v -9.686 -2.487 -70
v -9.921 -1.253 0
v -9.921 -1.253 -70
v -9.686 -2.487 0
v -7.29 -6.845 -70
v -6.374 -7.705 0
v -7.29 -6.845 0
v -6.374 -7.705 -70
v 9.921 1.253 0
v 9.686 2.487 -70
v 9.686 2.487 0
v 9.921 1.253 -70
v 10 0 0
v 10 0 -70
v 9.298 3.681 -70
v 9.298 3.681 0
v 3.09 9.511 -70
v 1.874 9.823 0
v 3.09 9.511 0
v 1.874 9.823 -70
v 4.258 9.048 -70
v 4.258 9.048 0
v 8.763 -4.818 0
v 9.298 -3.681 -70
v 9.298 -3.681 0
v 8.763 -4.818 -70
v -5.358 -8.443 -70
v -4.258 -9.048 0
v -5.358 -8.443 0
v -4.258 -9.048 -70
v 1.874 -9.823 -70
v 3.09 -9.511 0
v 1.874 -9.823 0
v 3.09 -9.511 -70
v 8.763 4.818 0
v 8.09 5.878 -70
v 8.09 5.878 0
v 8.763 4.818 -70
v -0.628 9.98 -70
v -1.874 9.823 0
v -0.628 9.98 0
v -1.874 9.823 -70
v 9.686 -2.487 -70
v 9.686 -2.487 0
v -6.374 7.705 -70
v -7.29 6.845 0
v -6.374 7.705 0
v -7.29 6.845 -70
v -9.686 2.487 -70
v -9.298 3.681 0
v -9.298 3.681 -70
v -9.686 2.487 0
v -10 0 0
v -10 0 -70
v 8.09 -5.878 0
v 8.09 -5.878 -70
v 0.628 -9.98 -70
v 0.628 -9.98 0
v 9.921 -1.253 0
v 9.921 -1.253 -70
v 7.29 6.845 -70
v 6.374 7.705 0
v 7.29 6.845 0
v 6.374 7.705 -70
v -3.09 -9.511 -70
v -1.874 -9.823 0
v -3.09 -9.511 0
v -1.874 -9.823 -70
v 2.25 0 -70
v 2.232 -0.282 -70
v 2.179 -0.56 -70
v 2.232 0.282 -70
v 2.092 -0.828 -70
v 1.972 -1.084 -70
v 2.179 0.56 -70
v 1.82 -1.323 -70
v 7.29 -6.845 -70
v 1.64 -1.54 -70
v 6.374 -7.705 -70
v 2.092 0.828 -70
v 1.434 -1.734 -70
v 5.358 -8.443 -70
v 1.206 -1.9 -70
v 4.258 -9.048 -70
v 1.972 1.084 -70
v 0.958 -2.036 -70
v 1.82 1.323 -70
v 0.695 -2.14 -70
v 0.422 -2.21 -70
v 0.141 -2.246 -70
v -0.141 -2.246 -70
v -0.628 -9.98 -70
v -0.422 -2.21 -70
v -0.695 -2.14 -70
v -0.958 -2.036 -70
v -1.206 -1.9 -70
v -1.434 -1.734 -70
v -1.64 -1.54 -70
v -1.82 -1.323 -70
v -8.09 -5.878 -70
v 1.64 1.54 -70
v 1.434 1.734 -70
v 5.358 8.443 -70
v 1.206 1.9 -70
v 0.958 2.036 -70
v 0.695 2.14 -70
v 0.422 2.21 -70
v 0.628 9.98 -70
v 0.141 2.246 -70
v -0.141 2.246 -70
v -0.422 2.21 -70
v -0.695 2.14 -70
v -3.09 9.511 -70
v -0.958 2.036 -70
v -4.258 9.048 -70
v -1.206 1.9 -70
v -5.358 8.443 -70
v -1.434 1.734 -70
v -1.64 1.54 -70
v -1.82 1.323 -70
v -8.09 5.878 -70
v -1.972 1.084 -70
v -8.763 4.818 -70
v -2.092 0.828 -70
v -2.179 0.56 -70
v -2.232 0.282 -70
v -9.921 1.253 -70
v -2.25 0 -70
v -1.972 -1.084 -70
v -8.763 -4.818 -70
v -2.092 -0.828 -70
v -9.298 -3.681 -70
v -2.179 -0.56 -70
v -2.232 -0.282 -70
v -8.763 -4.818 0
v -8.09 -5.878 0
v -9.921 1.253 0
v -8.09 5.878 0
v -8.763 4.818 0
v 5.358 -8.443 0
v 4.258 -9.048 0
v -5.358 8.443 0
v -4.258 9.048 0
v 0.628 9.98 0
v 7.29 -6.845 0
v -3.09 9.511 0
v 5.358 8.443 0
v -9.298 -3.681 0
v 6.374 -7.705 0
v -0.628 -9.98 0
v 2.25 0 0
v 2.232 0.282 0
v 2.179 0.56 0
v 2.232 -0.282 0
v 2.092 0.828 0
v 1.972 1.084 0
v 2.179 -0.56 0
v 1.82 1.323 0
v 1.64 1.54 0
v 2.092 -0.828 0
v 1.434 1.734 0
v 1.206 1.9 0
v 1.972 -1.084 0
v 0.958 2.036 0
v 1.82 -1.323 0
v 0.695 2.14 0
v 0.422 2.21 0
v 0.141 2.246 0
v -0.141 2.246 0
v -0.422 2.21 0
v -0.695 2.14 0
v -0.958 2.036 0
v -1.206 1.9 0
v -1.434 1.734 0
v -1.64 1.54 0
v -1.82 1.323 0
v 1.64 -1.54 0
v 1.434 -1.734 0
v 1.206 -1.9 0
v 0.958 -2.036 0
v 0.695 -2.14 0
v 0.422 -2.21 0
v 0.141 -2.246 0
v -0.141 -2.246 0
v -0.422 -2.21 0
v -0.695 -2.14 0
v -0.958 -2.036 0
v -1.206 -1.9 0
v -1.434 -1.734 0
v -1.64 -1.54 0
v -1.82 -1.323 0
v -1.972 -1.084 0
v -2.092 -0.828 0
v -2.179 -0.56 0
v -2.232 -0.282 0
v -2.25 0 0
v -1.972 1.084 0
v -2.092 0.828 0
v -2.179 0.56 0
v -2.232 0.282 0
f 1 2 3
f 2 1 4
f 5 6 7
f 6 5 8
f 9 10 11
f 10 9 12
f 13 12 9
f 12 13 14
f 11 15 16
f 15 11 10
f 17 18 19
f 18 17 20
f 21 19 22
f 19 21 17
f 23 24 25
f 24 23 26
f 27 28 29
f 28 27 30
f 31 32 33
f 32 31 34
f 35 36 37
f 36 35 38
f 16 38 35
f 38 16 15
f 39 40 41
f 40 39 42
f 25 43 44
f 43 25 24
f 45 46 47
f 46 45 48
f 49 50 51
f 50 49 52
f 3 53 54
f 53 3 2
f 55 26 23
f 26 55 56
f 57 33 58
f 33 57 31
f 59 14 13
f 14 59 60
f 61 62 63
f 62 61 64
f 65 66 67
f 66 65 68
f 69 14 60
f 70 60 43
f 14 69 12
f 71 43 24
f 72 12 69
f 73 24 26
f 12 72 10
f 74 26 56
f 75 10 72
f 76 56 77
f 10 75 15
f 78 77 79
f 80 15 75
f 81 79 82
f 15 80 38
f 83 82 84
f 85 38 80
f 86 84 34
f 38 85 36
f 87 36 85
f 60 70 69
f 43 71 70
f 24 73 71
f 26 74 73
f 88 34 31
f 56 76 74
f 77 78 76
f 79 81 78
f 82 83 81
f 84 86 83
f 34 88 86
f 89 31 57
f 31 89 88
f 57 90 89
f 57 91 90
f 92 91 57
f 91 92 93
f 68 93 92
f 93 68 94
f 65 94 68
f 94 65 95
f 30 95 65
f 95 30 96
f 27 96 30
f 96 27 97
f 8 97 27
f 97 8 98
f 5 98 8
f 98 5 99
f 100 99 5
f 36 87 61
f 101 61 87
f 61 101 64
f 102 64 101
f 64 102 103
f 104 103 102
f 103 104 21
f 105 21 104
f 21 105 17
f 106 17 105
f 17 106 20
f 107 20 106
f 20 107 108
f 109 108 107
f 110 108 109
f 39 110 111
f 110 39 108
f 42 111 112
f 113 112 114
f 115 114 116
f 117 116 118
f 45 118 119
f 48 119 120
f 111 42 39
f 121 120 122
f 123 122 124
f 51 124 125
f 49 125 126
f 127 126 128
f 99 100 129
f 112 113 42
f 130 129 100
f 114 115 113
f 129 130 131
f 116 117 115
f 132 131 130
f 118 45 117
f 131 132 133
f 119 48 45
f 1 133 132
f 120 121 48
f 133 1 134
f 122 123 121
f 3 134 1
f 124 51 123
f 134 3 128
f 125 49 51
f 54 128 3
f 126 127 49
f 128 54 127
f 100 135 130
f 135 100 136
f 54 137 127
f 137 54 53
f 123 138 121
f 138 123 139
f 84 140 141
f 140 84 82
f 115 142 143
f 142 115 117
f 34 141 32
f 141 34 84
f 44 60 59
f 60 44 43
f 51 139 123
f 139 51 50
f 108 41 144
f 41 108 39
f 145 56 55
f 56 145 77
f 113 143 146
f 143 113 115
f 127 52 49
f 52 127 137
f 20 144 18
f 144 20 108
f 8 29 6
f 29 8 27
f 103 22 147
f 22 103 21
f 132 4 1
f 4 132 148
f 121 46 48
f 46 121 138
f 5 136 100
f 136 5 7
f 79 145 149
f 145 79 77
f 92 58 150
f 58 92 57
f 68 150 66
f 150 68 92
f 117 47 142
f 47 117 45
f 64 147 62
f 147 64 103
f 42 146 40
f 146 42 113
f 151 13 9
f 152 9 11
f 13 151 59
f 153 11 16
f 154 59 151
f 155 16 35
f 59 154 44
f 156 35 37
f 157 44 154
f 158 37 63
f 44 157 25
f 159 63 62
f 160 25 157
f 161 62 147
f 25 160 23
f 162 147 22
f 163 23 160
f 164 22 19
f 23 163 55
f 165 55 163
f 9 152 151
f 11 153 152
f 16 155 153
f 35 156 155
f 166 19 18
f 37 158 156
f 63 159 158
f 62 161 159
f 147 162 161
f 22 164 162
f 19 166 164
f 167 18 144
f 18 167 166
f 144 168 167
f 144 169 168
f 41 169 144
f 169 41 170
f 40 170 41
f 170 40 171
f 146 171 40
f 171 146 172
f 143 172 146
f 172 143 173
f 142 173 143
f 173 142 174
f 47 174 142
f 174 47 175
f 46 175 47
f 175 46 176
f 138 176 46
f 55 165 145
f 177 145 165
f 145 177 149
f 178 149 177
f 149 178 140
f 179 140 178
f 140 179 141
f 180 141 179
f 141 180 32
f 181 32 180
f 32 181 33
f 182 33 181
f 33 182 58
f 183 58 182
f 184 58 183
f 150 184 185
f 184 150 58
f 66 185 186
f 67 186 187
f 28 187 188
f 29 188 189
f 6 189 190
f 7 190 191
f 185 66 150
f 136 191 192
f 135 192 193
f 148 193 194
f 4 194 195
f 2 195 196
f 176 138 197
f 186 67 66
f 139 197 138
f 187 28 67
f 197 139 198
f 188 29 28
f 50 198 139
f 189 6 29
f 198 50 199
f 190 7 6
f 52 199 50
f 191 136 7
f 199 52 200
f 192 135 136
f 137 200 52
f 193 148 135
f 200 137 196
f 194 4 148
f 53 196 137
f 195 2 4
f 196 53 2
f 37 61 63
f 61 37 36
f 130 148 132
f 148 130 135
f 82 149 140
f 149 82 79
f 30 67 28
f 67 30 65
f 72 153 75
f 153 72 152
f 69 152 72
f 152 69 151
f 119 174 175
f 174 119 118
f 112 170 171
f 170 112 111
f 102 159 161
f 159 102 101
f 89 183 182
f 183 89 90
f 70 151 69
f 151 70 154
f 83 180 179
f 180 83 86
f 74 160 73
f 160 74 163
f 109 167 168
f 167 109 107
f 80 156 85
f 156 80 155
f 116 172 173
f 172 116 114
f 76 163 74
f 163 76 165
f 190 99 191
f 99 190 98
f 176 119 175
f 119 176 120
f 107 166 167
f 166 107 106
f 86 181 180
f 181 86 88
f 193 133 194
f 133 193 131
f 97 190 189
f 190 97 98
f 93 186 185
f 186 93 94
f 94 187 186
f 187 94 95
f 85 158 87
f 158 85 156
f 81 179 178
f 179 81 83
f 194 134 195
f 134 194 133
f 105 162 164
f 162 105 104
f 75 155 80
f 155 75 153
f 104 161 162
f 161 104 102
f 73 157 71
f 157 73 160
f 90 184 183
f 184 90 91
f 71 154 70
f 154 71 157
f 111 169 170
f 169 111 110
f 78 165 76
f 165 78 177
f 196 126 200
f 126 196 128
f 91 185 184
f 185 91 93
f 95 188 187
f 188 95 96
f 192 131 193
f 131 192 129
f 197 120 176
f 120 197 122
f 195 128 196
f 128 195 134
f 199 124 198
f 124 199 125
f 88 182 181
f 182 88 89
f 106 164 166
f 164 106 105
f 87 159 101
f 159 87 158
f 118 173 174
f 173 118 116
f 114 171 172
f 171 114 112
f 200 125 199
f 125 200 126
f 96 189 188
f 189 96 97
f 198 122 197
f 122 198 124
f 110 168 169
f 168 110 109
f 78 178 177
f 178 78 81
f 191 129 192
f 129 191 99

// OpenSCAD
$fn = 50;


difference() {
	union() {
		translate(v = [0, 0, -70.0000000000]) {
			cylinder(h = 70, r = 10.0000000000);
		}
	}
	union() {
		#translate(v = [0, 0, -70]) {
			cylinder(h = 70, r = 2.2500000000);
		}
	}
}
